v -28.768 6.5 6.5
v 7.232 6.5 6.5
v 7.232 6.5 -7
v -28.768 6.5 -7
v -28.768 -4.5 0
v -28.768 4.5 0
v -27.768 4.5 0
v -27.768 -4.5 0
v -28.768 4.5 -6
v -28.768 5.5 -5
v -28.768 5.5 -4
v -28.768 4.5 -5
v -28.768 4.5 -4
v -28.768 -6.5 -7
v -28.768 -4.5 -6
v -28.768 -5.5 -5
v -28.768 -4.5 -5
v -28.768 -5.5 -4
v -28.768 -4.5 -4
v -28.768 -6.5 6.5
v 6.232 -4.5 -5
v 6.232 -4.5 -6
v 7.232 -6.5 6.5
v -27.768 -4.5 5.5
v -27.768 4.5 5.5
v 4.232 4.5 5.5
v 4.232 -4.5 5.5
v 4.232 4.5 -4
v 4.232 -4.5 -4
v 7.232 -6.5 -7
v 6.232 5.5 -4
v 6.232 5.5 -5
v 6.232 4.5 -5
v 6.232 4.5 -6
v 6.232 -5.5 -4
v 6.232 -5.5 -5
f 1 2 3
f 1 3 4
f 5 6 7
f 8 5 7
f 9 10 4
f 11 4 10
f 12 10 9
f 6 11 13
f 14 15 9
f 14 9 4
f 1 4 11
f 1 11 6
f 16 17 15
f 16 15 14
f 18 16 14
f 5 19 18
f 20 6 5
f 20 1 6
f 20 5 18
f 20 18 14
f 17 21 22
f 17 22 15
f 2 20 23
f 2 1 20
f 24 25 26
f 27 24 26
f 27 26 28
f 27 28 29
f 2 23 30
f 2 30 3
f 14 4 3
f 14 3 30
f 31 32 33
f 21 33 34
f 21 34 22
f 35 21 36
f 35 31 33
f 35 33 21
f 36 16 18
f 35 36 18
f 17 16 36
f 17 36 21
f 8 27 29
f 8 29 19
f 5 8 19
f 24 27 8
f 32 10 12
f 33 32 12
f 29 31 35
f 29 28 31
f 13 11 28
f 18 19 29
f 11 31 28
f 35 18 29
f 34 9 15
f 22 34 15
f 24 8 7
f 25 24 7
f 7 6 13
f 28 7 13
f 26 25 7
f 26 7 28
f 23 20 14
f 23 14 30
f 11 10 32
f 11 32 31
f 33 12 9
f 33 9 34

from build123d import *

# Parameters (mm, degrees)
F0_W     = 32
F0_H     = 9
F0_W_2   = 1
F1_DEPTH = 6.5
F2_DEPTH = 5.5
F3_DEPTH = 7
F4_W     = 1
F4_H     = 1
F5_DEPTH = 35
F8_DEPTH = 2
F4_W_2   = 9
F9_DEPTH = 35


with BuildPart() as f1:
    # F0 (on Top) → F1 (new body)
    with BuildSketch(Plane.XY):
        Polygon((4.2322745472, -4.5), (-27.7677254528, -4.5), (-28.7677254528, -4.5), (-28.7677254528, -6.5), (7.2322745472, -6.5), (7.2322745472, 6.5), (-28.7677254528, 6.5), (-28.7677254528, 4.5), (-27.7677254528, 4.5), (4.2322745472, 4.5), align=None)
        with Locations((-11.7677254528, 0)):
            Rectangle(F0_W, F0_H)
        with Locations((-28.2677254528, 0)):
            Rectangle(F0_W_2, F0_H)
    extrude(amount=F1_DEPTH)

    # F0 (on Top) → F2 (cut)
    with BuildSketch(Plane.XY):
        with Locations((-11.7677254528, 0)):
            Rectangle(F0_W, F0_H)
    extrude(amount=F2_DEPTH, mode=Mode.SUBTRACT)

    # F0 (on Top) → F3 (join)
    with BuildSketch(Plane.XY):
        Polygon((4.2322745472, -4.5), (-27.7677254528, -4.5), (-28.7677254528, -4.5), (-28.7677254528, -6.5), (7.2322745472, -6.5), (7.2322745472, 6.5), (-28.7677254528, 6.5), (-28.7677254528, 4.5), (-27.7677254528, 4.5), (4.2322745472, 4.5), align=None)
    extrude(amount=-F3_DEPTH)

    # F4 (on face) → F5 (cut)
    with BuildSketch(Plane(origin=(-28.7677254528, 0, 0), x_dir=(0, -1, 0), z_dir=(-1, 0, 0))):
        with Locations((-5, -4.5)):
            Rectangle(F4_W, F4_H)
    extrude(amount=-F5_DEPTH, mode=Mode.SUBTRACT)

    # F6: F1 across plane


with BuildPart() as f1_1:
    add(f1.part)
    add(f1.part.mirror(Plane.XZ), mode=Mode.INTERSECT)

    # F7 (on face) → F8 (cut)
    with BuildSketch(Plane(origin=(4.2322745472, 0, 0), x_dir=(0, -1, 0), z_dir=(-1, 0, 0))):
        Polygon((4.5, -4), (-4.5, -4), (-4.5, -5), (-4.5, -7), (4.5, -7), (4.5, -5), align=None)
    extrude(amount=-F8_DEPTH, mode=Mode.SUBTRACT)

    # F4 (on face) → F9 (join, through all)
    with BuildSketch(Plane(origin=(-28.7677254528, 0, 0), x_dir=(0, -1, 0), z_dir=(-1, 0, 0))):
        with Locations((0, -6.5)):
            Rectangle(F4_W_2, F4_H)
    extrude(amount=-F9_DEPTH)


solid = f1_1.part
